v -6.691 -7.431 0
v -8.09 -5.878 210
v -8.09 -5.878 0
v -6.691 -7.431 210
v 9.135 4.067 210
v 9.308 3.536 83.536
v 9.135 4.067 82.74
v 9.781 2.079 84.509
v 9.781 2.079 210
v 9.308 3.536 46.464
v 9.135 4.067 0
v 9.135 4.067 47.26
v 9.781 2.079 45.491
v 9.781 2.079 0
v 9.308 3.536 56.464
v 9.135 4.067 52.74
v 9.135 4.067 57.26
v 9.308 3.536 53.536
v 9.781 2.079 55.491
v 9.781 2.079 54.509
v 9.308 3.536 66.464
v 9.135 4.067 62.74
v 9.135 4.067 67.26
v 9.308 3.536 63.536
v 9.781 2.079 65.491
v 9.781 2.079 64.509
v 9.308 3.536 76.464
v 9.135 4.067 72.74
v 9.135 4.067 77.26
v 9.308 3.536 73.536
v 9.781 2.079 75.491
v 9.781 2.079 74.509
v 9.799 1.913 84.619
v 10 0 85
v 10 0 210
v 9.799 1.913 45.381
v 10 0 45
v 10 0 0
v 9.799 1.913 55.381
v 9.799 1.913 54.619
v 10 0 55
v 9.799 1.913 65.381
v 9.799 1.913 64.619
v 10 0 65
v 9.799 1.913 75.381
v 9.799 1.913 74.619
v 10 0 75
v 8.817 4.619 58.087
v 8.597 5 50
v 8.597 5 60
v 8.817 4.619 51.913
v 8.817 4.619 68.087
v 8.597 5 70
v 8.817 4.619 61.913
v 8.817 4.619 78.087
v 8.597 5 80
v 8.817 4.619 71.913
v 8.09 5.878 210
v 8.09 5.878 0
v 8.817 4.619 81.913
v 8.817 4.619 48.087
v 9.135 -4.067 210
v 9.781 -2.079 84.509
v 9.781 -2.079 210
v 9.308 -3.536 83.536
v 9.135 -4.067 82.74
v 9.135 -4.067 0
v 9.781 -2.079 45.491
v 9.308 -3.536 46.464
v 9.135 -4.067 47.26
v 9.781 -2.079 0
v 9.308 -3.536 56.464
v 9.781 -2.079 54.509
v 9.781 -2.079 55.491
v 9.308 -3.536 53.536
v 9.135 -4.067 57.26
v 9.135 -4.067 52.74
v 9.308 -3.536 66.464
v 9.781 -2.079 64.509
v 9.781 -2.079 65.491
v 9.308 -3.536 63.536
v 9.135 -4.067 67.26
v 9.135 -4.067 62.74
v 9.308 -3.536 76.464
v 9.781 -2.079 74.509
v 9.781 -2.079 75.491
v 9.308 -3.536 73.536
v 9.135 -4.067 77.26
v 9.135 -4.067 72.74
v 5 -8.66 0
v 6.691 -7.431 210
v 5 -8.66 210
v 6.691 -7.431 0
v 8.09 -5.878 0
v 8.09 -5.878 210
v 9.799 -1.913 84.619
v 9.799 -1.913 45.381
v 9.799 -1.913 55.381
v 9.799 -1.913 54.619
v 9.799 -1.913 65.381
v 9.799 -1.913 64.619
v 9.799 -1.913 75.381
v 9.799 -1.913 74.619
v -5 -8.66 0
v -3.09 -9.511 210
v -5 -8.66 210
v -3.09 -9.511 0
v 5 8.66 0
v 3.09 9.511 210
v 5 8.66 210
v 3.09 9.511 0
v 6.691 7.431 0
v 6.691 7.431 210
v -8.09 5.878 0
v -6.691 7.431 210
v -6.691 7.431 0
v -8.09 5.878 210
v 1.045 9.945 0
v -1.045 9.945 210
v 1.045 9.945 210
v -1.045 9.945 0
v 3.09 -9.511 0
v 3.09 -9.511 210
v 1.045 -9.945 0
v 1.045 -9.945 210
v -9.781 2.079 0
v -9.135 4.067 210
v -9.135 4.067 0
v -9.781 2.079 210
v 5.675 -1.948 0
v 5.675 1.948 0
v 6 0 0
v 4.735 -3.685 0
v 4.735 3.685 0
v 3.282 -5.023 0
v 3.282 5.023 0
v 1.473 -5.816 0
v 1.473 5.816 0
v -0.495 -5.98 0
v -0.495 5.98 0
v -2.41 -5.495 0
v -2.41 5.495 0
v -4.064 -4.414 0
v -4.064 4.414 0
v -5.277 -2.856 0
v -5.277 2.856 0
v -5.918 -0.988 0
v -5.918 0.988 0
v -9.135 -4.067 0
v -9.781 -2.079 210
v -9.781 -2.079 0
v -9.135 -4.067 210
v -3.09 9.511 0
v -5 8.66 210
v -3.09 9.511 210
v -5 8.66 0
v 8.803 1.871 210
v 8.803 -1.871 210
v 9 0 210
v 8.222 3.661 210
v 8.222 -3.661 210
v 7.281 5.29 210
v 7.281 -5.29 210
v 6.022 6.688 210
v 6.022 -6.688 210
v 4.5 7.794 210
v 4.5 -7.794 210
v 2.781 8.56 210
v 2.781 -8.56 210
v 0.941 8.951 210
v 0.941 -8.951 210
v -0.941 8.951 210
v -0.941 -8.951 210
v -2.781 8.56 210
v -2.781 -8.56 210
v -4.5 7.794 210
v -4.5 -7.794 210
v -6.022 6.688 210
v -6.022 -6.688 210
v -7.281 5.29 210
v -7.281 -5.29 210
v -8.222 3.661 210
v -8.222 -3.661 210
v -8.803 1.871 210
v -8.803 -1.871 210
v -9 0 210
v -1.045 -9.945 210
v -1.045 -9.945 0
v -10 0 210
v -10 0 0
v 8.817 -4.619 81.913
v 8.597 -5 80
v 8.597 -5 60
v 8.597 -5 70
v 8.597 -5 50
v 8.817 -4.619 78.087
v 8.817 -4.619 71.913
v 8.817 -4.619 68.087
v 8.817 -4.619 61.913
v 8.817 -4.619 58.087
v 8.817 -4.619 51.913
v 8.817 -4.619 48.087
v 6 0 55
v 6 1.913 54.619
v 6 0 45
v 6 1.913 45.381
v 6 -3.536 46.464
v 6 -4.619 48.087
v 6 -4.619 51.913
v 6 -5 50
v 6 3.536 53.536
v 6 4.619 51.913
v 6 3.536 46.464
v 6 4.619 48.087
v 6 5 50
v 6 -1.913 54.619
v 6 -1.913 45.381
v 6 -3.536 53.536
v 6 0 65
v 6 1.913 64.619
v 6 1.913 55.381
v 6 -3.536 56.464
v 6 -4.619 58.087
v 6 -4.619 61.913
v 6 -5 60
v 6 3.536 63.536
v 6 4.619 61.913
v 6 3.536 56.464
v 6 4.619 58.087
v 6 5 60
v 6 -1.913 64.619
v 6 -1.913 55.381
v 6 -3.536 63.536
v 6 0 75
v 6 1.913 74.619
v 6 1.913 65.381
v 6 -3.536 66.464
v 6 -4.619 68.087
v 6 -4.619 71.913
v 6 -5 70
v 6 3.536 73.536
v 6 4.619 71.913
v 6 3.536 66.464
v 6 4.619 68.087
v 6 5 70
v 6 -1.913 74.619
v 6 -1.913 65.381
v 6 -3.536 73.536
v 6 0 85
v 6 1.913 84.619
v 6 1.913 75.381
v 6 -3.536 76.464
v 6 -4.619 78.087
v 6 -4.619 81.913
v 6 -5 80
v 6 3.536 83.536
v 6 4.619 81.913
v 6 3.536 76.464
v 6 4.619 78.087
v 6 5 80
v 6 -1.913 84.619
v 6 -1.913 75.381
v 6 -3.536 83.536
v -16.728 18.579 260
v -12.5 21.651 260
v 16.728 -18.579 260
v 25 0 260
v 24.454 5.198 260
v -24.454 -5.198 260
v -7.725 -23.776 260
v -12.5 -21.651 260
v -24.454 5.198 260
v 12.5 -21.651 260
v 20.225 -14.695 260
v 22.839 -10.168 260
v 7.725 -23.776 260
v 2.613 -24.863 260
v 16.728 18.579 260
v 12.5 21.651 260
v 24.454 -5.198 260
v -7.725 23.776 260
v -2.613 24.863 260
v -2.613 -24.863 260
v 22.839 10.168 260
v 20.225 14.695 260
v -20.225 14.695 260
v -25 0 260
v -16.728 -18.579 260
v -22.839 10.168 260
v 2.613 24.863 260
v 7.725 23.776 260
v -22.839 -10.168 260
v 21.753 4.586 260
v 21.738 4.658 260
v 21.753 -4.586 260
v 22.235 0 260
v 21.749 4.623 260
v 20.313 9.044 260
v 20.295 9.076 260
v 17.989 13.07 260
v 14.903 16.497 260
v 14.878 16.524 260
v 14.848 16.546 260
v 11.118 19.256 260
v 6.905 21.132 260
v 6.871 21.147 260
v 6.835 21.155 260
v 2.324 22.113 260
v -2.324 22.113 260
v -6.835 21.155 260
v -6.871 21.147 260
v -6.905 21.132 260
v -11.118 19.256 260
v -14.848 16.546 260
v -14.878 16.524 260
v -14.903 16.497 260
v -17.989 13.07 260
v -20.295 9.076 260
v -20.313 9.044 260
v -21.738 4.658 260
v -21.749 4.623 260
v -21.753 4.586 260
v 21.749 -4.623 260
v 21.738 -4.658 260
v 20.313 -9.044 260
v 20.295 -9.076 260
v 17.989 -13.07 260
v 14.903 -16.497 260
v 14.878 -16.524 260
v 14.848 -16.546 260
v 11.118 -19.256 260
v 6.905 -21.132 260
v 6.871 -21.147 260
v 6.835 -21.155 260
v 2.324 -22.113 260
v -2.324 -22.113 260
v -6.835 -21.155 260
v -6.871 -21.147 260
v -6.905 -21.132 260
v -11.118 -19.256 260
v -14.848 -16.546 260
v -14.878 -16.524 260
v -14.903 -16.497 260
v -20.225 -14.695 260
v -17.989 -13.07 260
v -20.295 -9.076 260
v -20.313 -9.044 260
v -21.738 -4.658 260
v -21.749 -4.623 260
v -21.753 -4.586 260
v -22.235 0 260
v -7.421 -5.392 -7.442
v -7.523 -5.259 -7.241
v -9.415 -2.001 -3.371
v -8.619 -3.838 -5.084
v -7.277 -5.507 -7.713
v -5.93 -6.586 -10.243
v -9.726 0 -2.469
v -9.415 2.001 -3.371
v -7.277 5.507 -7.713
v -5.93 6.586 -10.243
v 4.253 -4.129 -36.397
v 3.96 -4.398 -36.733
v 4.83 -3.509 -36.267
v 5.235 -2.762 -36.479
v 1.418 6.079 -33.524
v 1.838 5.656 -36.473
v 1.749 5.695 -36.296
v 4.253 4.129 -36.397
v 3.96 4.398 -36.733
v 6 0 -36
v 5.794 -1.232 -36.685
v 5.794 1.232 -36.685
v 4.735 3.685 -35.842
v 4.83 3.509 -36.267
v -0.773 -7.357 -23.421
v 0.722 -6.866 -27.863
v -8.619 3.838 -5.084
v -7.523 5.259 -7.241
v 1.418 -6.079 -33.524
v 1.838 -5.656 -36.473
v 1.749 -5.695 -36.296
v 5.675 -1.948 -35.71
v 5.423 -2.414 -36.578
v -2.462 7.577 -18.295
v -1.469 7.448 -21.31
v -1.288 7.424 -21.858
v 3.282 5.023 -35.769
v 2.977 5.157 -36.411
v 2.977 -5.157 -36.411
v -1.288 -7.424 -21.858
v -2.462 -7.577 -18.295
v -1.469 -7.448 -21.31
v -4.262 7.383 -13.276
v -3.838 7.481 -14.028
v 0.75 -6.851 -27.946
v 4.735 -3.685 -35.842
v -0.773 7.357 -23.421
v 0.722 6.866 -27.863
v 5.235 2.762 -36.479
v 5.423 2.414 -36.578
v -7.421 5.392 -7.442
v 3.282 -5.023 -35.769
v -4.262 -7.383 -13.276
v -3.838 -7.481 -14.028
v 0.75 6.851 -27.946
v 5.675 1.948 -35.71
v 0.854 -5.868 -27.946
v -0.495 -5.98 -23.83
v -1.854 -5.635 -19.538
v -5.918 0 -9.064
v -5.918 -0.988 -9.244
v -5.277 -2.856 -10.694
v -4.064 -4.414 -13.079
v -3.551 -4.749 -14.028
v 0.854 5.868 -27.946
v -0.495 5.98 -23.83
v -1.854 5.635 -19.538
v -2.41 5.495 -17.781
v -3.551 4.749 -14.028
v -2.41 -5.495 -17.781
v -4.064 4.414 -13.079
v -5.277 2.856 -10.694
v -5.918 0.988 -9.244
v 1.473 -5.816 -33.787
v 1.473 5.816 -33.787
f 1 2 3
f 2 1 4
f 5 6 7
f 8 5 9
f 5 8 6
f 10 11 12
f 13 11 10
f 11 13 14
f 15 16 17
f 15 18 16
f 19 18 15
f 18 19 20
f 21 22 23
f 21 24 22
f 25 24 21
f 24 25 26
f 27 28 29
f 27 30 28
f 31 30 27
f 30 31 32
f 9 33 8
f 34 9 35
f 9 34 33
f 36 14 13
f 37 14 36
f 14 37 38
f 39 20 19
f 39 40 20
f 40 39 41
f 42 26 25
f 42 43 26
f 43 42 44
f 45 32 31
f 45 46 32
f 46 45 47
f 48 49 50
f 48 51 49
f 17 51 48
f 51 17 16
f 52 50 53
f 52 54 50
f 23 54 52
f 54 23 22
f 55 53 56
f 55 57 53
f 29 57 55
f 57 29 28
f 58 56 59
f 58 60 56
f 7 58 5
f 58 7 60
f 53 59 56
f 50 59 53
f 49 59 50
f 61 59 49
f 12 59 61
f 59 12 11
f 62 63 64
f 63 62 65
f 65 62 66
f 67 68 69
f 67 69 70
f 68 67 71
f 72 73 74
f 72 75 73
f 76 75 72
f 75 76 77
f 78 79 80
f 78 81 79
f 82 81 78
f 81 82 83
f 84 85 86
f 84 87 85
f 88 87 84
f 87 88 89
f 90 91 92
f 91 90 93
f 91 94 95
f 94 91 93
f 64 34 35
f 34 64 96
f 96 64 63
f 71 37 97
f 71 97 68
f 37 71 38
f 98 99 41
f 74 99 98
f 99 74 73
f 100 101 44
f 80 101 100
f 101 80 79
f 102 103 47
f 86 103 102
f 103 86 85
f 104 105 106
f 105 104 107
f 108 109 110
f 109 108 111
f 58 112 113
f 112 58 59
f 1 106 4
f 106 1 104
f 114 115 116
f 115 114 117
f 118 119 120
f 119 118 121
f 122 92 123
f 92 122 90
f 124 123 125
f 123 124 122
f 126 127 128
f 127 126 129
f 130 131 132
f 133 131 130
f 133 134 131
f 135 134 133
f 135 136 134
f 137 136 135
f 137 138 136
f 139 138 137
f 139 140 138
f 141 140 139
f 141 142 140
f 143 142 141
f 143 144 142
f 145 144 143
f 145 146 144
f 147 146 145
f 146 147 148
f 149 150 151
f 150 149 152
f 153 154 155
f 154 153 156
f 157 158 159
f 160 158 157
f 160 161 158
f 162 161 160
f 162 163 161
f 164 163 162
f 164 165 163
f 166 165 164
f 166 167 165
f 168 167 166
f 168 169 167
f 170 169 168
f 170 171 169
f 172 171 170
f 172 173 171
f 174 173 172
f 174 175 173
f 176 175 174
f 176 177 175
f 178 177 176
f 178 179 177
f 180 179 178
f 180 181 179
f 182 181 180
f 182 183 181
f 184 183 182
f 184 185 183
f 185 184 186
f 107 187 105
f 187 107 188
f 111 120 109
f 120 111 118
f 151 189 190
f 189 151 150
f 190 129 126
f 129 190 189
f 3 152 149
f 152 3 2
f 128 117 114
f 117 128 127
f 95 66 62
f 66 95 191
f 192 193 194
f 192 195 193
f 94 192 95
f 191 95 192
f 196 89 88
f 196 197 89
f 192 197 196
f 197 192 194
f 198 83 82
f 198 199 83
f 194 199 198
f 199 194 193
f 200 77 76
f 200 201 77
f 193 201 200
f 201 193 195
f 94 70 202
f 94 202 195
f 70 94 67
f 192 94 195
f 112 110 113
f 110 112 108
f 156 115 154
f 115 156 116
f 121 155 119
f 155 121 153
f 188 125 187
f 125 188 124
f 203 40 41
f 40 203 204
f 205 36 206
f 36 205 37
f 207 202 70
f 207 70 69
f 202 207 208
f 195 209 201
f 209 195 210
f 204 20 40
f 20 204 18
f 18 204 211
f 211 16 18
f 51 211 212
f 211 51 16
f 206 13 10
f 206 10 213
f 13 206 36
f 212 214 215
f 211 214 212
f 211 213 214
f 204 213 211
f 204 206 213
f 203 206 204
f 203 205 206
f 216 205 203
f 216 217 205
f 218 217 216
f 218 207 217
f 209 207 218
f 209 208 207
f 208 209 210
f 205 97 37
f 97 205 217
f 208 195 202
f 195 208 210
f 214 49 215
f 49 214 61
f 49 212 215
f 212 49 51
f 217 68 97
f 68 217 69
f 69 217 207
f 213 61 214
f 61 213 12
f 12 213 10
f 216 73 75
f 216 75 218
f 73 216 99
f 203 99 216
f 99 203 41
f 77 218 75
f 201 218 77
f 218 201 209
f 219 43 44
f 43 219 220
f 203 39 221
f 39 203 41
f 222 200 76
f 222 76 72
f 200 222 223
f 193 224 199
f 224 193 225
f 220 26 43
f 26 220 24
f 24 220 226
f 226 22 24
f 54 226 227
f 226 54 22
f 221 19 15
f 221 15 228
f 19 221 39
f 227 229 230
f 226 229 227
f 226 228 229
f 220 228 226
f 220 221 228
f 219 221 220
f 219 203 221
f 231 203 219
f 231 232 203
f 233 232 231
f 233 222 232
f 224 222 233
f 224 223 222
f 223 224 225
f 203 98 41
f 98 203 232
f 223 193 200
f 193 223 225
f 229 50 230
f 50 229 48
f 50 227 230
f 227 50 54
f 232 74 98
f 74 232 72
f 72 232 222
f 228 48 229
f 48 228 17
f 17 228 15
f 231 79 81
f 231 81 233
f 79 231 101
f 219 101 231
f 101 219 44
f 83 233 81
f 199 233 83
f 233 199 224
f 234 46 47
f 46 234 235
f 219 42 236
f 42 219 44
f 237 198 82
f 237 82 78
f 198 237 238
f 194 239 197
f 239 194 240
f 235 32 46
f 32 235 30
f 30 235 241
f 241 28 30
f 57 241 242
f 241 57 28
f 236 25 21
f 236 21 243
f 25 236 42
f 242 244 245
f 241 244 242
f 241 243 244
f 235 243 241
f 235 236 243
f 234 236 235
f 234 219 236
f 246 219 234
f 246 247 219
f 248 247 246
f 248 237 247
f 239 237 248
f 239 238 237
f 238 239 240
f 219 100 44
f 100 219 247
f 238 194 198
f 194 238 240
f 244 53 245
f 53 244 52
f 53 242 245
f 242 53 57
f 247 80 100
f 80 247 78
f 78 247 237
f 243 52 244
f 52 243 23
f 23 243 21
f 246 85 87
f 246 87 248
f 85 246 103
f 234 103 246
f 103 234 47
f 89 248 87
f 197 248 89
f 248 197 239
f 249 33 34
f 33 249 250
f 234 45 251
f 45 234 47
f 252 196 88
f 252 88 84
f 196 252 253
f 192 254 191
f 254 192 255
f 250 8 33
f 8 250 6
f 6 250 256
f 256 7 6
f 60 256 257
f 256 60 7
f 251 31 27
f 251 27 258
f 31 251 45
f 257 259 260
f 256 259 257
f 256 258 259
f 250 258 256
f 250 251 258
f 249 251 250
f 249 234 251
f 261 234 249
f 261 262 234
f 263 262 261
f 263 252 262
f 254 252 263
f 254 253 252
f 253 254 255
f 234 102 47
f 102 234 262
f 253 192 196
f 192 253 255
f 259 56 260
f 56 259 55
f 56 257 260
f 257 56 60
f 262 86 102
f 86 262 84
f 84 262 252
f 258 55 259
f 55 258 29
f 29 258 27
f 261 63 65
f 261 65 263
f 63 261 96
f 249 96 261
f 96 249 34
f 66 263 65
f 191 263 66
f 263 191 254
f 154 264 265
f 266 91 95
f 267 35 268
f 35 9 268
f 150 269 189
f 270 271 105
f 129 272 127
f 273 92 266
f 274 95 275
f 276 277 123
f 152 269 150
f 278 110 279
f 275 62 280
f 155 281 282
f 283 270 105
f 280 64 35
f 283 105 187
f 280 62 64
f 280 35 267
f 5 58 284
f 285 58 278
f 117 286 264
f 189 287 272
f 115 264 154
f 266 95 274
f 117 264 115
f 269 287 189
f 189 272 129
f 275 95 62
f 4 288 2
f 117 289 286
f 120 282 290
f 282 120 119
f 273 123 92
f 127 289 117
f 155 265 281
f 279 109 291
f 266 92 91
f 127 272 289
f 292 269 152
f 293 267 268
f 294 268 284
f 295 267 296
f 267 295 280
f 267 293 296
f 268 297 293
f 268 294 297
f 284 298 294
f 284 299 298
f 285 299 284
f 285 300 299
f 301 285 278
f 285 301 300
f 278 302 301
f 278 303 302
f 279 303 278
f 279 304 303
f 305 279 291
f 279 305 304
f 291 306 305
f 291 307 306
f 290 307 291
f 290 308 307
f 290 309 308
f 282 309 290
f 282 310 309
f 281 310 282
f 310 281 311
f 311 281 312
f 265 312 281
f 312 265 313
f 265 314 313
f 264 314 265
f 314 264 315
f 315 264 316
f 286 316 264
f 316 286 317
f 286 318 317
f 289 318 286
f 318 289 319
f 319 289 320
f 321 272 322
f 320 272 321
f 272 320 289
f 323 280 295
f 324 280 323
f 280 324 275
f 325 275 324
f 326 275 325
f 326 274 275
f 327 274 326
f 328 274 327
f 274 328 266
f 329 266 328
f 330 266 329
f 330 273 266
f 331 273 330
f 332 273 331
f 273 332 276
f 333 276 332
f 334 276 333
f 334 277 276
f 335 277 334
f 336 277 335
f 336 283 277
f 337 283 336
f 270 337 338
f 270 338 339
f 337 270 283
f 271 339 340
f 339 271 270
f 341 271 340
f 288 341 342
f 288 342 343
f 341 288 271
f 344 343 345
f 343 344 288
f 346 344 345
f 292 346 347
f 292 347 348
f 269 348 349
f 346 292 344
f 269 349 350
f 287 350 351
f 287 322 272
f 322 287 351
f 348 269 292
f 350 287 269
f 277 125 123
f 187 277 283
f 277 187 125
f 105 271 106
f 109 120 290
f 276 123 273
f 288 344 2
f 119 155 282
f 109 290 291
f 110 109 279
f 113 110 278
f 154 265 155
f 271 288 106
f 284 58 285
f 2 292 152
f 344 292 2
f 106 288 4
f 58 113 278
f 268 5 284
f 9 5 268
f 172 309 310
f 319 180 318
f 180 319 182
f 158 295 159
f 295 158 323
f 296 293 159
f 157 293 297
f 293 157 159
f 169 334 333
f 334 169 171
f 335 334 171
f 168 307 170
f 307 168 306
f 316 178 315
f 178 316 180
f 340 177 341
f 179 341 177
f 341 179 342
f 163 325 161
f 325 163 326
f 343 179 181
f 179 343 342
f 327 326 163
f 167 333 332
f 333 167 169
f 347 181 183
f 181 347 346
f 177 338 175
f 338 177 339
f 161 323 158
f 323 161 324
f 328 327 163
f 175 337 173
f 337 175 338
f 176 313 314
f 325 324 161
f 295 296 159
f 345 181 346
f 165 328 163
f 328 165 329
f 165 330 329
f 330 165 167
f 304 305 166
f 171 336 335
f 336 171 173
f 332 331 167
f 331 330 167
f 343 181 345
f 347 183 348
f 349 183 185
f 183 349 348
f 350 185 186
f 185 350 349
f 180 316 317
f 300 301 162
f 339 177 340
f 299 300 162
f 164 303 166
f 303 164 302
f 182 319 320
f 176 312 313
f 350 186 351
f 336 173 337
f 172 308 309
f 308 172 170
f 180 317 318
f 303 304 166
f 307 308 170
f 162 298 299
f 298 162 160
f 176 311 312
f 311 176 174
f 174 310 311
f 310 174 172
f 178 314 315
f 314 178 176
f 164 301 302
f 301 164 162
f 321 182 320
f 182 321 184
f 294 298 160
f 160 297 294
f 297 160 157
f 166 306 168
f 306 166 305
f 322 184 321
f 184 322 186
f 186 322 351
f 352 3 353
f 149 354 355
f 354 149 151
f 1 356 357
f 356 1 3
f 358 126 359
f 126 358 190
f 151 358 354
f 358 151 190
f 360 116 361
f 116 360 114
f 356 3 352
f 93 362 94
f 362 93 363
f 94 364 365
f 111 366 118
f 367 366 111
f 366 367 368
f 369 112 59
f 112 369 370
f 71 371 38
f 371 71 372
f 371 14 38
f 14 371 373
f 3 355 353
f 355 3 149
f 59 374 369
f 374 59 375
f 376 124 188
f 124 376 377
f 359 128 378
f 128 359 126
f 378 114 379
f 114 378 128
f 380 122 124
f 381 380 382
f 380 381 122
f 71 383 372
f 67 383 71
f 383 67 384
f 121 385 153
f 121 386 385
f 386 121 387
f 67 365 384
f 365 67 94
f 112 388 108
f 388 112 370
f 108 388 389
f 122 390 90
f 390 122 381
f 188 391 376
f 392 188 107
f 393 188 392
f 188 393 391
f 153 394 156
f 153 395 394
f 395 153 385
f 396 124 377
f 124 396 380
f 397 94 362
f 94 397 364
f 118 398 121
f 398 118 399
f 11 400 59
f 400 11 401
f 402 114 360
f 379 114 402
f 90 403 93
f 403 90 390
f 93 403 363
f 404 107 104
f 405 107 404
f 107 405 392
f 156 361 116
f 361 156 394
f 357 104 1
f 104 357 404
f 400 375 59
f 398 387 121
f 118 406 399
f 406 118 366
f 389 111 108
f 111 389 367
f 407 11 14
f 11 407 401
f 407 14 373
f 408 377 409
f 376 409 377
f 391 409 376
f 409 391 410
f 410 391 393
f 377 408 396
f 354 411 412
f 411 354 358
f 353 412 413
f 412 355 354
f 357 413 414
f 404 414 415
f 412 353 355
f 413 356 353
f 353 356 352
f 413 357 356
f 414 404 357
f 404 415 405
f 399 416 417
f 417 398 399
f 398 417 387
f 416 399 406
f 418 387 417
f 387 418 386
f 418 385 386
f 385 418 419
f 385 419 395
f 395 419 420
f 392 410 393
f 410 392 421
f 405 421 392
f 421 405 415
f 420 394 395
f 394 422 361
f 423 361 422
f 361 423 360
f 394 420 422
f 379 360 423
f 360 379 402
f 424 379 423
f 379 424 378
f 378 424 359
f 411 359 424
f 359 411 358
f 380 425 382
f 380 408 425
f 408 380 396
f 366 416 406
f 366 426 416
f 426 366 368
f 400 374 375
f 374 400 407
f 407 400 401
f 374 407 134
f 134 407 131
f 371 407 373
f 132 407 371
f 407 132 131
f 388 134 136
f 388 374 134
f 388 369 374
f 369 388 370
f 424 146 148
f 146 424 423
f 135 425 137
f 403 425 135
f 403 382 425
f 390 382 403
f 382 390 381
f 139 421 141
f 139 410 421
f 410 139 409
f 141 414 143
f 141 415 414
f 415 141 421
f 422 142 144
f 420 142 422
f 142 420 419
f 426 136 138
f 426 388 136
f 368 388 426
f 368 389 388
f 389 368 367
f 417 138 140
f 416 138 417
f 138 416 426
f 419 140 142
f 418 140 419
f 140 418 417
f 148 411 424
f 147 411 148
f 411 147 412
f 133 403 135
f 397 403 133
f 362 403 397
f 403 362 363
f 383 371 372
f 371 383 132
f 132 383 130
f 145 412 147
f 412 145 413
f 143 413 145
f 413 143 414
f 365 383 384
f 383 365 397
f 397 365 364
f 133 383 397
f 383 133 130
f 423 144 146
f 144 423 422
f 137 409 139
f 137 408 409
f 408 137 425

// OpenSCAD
difference () {

cylinder (210,10,10) ;
rotate ([0,90,0]) translate ([-50,0,6]) cylinder (5,5,5) ;
rotate ([0,90,0]) translate ([-60,0,6]) cylinder (5,5,5) ;
rotate ([0,90,0]) translate ([-70,0,6]) cylinder (5,5,5) ;
rotate ([0,90,0]) translate ([-80,0,6]) cylinder (5,5,5) ;
}
difference () {
translate ([0,0,210]) cylinder (50,10,25) ;
translate ([0,0,210]) cylinder (51,9,22.5) ;
}
difference () {
translate ([0,0,-45]) cylinder (45,5,10) ;
translate ([-67,0,-42.5]) sphere (70) ; 
translate ([0,0,-50])cylinder (500,6,6) ;

}
